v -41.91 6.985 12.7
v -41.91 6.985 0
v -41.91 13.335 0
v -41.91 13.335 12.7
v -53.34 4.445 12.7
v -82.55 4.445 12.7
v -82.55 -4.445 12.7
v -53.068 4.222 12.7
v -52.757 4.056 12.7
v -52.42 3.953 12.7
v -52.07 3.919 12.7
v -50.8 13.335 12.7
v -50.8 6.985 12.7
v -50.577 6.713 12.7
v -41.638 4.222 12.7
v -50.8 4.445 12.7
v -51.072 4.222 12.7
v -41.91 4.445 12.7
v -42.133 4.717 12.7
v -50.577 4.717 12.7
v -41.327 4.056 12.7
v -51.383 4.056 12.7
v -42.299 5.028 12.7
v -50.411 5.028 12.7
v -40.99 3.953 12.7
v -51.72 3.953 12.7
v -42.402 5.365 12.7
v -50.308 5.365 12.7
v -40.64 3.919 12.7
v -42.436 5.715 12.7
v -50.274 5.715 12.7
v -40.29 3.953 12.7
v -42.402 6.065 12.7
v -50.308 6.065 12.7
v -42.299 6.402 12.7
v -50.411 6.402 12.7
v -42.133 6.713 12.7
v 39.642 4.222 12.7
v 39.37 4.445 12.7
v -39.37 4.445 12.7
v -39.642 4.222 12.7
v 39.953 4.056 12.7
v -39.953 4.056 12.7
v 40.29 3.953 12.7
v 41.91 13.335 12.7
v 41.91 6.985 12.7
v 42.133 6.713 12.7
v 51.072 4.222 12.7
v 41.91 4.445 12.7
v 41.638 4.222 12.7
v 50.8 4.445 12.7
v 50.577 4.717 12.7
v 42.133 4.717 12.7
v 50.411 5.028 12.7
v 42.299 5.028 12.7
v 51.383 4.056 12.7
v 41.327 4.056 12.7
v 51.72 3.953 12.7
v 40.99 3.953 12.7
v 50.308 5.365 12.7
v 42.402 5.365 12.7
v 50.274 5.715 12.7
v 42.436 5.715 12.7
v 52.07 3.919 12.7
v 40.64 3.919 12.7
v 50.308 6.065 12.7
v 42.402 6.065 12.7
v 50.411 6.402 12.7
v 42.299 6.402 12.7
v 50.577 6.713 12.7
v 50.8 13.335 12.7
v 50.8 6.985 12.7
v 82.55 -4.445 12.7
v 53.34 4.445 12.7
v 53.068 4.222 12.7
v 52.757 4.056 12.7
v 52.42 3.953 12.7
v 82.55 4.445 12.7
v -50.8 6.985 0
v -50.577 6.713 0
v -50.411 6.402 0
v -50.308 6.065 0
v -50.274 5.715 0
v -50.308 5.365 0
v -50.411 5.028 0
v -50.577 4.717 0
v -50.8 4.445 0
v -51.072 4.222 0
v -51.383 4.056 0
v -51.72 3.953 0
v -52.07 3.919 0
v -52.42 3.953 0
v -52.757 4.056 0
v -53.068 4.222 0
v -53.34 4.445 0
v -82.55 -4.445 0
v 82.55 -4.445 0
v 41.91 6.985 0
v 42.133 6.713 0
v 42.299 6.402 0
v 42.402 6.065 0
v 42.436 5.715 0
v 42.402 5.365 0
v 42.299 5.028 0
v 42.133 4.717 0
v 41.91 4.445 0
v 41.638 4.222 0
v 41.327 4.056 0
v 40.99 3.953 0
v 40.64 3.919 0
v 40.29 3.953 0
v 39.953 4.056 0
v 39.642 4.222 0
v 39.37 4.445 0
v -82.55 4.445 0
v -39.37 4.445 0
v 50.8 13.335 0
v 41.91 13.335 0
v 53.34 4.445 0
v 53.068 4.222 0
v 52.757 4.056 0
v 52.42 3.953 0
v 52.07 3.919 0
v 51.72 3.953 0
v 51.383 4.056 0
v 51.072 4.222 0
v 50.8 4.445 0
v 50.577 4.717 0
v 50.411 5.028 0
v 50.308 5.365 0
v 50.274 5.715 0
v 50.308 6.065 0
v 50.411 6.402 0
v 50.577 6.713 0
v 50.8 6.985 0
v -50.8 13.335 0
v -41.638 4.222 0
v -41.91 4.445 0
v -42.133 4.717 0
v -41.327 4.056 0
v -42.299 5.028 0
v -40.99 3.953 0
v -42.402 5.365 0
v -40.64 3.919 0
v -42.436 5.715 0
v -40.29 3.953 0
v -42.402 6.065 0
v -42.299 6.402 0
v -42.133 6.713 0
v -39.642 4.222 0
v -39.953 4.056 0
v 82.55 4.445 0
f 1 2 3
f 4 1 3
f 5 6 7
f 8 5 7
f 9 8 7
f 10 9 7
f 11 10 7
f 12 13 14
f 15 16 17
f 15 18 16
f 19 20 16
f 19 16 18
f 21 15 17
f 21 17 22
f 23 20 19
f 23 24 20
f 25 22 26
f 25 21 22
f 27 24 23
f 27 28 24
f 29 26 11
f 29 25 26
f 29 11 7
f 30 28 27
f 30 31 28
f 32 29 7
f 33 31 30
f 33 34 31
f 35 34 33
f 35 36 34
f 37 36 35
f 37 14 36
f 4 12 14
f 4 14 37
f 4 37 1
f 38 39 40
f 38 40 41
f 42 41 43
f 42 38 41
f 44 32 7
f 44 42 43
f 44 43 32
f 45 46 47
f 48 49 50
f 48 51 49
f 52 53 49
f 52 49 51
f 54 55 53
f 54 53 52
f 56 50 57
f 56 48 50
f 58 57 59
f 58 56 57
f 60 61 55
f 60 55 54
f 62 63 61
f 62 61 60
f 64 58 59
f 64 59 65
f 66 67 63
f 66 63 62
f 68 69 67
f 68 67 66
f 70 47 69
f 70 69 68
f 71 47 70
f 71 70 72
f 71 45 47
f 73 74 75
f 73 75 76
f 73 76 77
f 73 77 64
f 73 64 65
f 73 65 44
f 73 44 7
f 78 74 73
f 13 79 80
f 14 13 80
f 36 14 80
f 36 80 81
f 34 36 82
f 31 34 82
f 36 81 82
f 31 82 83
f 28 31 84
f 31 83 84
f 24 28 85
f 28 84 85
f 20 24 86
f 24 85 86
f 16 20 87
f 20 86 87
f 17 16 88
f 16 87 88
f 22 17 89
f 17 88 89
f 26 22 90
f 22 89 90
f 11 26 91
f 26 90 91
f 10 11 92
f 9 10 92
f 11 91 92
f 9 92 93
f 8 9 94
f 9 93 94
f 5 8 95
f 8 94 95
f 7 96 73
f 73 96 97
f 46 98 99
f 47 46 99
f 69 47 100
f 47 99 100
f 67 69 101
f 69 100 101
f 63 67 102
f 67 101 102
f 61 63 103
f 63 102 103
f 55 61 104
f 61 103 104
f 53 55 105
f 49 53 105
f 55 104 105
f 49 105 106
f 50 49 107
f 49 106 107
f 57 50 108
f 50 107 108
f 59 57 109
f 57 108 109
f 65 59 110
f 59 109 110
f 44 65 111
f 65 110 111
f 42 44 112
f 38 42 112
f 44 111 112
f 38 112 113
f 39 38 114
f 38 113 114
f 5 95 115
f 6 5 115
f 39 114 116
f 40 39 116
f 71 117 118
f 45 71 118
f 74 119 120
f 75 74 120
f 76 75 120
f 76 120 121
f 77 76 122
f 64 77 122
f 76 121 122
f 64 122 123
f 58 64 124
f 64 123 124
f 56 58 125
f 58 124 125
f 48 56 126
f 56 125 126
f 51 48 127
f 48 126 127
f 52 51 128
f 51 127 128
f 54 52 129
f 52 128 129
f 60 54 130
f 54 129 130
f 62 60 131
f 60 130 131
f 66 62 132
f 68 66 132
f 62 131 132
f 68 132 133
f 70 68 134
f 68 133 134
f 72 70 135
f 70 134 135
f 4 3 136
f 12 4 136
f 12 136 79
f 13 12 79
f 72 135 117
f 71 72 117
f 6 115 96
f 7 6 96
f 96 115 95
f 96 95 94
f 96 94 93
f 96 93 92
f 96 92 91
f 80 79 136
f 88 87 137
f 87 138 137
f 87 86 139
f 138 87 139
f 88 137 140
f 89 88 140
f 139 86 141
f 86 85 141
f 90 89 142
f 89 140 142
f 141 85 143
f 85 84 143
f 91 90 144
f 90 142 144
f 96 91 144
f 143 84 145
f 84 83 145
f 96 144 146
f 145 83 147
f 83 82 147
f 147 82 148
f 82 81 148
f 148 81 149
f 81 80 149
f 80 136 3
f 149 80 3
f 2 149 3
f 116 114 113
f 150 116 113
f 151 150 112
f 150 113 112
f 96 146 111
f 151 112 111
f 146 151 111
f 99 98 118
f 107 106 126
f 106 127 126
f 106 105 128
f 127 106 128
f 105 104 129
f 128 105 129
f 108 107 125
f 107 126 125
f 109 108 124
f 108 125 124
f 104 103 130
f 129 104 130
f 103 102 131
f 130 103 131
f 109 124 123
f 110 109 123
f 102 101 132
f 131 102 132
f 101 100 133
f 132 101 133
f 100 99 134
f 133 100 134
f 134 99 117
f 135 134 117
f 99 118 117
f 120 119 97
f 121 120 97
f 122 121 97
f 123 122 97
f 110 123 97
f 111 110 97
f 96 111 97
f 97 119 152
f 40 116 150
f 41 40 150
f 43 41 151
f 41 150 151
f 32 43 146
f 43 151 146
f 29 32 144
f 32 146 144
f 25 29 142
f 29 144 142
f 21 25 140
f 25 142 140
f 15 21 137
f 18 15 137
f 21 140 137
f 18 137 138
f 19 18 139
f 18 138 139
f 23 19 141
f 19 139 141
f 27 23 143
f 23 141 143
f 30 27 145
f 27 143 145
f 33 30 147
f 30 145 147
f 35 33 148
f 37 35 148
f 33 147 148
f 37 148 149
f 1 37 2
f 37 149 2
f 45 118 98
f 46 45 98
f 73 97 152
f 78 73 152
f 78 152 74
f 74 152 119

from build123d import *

# Parameters (mm, degrees)
BOSS_EXTRUDE1_DEPTH = 12.7


with BuildPart() as part:
    # Sketch1 → Boss-Extrude1 (new body)
    with BuildSketch(Plane.XY):
        with BuildLine():
            Line((-53.34, 4.445), (-82.55, 4.445))
            Line((-82.55, 4.445), (-82.55, -4.445))
            Line((-82.55, -4.445), (82.55, -4.445))
            Line((82.55, -4.445), (82.55, 4.445))
            Line((82.55, 4.445), (53.34, 4.445))
            ThreePointArc((53.34, 4.445), (50.8, 4.445), (50.8, 6.985))
            Line((50.8, 6.985), (50.8, 13.335))
            Line((50.8, 13.335), (41.91, 13.335))
            Line((41.91, 13.335), (41.91, 6.985))
            ThreePointArc((41.91, 6.985), (41.91, 4.445), (39.37, 4.445))
            Line((39.37, 4.445), (-39.37, 4.445))
            ThreePointArc((-39.37, 4.445), (-41.91, 4.445), (-41.91, 6.985))
            Line((-41.91, 6.985), (-41.91, 13.335))
            Line((-41.91, 13.335), (-50.8, 13.335))
            Line((-50.8, 13.335), (-50.8, 6.985))
            ThreePointArc((-50.8, 6.985), (-50.8, 4.445), (-53.34, 4.445))
        make_face()
    extrude(amount=BOSS_EXTRUDE1_DEPTH)


solid = part.part
